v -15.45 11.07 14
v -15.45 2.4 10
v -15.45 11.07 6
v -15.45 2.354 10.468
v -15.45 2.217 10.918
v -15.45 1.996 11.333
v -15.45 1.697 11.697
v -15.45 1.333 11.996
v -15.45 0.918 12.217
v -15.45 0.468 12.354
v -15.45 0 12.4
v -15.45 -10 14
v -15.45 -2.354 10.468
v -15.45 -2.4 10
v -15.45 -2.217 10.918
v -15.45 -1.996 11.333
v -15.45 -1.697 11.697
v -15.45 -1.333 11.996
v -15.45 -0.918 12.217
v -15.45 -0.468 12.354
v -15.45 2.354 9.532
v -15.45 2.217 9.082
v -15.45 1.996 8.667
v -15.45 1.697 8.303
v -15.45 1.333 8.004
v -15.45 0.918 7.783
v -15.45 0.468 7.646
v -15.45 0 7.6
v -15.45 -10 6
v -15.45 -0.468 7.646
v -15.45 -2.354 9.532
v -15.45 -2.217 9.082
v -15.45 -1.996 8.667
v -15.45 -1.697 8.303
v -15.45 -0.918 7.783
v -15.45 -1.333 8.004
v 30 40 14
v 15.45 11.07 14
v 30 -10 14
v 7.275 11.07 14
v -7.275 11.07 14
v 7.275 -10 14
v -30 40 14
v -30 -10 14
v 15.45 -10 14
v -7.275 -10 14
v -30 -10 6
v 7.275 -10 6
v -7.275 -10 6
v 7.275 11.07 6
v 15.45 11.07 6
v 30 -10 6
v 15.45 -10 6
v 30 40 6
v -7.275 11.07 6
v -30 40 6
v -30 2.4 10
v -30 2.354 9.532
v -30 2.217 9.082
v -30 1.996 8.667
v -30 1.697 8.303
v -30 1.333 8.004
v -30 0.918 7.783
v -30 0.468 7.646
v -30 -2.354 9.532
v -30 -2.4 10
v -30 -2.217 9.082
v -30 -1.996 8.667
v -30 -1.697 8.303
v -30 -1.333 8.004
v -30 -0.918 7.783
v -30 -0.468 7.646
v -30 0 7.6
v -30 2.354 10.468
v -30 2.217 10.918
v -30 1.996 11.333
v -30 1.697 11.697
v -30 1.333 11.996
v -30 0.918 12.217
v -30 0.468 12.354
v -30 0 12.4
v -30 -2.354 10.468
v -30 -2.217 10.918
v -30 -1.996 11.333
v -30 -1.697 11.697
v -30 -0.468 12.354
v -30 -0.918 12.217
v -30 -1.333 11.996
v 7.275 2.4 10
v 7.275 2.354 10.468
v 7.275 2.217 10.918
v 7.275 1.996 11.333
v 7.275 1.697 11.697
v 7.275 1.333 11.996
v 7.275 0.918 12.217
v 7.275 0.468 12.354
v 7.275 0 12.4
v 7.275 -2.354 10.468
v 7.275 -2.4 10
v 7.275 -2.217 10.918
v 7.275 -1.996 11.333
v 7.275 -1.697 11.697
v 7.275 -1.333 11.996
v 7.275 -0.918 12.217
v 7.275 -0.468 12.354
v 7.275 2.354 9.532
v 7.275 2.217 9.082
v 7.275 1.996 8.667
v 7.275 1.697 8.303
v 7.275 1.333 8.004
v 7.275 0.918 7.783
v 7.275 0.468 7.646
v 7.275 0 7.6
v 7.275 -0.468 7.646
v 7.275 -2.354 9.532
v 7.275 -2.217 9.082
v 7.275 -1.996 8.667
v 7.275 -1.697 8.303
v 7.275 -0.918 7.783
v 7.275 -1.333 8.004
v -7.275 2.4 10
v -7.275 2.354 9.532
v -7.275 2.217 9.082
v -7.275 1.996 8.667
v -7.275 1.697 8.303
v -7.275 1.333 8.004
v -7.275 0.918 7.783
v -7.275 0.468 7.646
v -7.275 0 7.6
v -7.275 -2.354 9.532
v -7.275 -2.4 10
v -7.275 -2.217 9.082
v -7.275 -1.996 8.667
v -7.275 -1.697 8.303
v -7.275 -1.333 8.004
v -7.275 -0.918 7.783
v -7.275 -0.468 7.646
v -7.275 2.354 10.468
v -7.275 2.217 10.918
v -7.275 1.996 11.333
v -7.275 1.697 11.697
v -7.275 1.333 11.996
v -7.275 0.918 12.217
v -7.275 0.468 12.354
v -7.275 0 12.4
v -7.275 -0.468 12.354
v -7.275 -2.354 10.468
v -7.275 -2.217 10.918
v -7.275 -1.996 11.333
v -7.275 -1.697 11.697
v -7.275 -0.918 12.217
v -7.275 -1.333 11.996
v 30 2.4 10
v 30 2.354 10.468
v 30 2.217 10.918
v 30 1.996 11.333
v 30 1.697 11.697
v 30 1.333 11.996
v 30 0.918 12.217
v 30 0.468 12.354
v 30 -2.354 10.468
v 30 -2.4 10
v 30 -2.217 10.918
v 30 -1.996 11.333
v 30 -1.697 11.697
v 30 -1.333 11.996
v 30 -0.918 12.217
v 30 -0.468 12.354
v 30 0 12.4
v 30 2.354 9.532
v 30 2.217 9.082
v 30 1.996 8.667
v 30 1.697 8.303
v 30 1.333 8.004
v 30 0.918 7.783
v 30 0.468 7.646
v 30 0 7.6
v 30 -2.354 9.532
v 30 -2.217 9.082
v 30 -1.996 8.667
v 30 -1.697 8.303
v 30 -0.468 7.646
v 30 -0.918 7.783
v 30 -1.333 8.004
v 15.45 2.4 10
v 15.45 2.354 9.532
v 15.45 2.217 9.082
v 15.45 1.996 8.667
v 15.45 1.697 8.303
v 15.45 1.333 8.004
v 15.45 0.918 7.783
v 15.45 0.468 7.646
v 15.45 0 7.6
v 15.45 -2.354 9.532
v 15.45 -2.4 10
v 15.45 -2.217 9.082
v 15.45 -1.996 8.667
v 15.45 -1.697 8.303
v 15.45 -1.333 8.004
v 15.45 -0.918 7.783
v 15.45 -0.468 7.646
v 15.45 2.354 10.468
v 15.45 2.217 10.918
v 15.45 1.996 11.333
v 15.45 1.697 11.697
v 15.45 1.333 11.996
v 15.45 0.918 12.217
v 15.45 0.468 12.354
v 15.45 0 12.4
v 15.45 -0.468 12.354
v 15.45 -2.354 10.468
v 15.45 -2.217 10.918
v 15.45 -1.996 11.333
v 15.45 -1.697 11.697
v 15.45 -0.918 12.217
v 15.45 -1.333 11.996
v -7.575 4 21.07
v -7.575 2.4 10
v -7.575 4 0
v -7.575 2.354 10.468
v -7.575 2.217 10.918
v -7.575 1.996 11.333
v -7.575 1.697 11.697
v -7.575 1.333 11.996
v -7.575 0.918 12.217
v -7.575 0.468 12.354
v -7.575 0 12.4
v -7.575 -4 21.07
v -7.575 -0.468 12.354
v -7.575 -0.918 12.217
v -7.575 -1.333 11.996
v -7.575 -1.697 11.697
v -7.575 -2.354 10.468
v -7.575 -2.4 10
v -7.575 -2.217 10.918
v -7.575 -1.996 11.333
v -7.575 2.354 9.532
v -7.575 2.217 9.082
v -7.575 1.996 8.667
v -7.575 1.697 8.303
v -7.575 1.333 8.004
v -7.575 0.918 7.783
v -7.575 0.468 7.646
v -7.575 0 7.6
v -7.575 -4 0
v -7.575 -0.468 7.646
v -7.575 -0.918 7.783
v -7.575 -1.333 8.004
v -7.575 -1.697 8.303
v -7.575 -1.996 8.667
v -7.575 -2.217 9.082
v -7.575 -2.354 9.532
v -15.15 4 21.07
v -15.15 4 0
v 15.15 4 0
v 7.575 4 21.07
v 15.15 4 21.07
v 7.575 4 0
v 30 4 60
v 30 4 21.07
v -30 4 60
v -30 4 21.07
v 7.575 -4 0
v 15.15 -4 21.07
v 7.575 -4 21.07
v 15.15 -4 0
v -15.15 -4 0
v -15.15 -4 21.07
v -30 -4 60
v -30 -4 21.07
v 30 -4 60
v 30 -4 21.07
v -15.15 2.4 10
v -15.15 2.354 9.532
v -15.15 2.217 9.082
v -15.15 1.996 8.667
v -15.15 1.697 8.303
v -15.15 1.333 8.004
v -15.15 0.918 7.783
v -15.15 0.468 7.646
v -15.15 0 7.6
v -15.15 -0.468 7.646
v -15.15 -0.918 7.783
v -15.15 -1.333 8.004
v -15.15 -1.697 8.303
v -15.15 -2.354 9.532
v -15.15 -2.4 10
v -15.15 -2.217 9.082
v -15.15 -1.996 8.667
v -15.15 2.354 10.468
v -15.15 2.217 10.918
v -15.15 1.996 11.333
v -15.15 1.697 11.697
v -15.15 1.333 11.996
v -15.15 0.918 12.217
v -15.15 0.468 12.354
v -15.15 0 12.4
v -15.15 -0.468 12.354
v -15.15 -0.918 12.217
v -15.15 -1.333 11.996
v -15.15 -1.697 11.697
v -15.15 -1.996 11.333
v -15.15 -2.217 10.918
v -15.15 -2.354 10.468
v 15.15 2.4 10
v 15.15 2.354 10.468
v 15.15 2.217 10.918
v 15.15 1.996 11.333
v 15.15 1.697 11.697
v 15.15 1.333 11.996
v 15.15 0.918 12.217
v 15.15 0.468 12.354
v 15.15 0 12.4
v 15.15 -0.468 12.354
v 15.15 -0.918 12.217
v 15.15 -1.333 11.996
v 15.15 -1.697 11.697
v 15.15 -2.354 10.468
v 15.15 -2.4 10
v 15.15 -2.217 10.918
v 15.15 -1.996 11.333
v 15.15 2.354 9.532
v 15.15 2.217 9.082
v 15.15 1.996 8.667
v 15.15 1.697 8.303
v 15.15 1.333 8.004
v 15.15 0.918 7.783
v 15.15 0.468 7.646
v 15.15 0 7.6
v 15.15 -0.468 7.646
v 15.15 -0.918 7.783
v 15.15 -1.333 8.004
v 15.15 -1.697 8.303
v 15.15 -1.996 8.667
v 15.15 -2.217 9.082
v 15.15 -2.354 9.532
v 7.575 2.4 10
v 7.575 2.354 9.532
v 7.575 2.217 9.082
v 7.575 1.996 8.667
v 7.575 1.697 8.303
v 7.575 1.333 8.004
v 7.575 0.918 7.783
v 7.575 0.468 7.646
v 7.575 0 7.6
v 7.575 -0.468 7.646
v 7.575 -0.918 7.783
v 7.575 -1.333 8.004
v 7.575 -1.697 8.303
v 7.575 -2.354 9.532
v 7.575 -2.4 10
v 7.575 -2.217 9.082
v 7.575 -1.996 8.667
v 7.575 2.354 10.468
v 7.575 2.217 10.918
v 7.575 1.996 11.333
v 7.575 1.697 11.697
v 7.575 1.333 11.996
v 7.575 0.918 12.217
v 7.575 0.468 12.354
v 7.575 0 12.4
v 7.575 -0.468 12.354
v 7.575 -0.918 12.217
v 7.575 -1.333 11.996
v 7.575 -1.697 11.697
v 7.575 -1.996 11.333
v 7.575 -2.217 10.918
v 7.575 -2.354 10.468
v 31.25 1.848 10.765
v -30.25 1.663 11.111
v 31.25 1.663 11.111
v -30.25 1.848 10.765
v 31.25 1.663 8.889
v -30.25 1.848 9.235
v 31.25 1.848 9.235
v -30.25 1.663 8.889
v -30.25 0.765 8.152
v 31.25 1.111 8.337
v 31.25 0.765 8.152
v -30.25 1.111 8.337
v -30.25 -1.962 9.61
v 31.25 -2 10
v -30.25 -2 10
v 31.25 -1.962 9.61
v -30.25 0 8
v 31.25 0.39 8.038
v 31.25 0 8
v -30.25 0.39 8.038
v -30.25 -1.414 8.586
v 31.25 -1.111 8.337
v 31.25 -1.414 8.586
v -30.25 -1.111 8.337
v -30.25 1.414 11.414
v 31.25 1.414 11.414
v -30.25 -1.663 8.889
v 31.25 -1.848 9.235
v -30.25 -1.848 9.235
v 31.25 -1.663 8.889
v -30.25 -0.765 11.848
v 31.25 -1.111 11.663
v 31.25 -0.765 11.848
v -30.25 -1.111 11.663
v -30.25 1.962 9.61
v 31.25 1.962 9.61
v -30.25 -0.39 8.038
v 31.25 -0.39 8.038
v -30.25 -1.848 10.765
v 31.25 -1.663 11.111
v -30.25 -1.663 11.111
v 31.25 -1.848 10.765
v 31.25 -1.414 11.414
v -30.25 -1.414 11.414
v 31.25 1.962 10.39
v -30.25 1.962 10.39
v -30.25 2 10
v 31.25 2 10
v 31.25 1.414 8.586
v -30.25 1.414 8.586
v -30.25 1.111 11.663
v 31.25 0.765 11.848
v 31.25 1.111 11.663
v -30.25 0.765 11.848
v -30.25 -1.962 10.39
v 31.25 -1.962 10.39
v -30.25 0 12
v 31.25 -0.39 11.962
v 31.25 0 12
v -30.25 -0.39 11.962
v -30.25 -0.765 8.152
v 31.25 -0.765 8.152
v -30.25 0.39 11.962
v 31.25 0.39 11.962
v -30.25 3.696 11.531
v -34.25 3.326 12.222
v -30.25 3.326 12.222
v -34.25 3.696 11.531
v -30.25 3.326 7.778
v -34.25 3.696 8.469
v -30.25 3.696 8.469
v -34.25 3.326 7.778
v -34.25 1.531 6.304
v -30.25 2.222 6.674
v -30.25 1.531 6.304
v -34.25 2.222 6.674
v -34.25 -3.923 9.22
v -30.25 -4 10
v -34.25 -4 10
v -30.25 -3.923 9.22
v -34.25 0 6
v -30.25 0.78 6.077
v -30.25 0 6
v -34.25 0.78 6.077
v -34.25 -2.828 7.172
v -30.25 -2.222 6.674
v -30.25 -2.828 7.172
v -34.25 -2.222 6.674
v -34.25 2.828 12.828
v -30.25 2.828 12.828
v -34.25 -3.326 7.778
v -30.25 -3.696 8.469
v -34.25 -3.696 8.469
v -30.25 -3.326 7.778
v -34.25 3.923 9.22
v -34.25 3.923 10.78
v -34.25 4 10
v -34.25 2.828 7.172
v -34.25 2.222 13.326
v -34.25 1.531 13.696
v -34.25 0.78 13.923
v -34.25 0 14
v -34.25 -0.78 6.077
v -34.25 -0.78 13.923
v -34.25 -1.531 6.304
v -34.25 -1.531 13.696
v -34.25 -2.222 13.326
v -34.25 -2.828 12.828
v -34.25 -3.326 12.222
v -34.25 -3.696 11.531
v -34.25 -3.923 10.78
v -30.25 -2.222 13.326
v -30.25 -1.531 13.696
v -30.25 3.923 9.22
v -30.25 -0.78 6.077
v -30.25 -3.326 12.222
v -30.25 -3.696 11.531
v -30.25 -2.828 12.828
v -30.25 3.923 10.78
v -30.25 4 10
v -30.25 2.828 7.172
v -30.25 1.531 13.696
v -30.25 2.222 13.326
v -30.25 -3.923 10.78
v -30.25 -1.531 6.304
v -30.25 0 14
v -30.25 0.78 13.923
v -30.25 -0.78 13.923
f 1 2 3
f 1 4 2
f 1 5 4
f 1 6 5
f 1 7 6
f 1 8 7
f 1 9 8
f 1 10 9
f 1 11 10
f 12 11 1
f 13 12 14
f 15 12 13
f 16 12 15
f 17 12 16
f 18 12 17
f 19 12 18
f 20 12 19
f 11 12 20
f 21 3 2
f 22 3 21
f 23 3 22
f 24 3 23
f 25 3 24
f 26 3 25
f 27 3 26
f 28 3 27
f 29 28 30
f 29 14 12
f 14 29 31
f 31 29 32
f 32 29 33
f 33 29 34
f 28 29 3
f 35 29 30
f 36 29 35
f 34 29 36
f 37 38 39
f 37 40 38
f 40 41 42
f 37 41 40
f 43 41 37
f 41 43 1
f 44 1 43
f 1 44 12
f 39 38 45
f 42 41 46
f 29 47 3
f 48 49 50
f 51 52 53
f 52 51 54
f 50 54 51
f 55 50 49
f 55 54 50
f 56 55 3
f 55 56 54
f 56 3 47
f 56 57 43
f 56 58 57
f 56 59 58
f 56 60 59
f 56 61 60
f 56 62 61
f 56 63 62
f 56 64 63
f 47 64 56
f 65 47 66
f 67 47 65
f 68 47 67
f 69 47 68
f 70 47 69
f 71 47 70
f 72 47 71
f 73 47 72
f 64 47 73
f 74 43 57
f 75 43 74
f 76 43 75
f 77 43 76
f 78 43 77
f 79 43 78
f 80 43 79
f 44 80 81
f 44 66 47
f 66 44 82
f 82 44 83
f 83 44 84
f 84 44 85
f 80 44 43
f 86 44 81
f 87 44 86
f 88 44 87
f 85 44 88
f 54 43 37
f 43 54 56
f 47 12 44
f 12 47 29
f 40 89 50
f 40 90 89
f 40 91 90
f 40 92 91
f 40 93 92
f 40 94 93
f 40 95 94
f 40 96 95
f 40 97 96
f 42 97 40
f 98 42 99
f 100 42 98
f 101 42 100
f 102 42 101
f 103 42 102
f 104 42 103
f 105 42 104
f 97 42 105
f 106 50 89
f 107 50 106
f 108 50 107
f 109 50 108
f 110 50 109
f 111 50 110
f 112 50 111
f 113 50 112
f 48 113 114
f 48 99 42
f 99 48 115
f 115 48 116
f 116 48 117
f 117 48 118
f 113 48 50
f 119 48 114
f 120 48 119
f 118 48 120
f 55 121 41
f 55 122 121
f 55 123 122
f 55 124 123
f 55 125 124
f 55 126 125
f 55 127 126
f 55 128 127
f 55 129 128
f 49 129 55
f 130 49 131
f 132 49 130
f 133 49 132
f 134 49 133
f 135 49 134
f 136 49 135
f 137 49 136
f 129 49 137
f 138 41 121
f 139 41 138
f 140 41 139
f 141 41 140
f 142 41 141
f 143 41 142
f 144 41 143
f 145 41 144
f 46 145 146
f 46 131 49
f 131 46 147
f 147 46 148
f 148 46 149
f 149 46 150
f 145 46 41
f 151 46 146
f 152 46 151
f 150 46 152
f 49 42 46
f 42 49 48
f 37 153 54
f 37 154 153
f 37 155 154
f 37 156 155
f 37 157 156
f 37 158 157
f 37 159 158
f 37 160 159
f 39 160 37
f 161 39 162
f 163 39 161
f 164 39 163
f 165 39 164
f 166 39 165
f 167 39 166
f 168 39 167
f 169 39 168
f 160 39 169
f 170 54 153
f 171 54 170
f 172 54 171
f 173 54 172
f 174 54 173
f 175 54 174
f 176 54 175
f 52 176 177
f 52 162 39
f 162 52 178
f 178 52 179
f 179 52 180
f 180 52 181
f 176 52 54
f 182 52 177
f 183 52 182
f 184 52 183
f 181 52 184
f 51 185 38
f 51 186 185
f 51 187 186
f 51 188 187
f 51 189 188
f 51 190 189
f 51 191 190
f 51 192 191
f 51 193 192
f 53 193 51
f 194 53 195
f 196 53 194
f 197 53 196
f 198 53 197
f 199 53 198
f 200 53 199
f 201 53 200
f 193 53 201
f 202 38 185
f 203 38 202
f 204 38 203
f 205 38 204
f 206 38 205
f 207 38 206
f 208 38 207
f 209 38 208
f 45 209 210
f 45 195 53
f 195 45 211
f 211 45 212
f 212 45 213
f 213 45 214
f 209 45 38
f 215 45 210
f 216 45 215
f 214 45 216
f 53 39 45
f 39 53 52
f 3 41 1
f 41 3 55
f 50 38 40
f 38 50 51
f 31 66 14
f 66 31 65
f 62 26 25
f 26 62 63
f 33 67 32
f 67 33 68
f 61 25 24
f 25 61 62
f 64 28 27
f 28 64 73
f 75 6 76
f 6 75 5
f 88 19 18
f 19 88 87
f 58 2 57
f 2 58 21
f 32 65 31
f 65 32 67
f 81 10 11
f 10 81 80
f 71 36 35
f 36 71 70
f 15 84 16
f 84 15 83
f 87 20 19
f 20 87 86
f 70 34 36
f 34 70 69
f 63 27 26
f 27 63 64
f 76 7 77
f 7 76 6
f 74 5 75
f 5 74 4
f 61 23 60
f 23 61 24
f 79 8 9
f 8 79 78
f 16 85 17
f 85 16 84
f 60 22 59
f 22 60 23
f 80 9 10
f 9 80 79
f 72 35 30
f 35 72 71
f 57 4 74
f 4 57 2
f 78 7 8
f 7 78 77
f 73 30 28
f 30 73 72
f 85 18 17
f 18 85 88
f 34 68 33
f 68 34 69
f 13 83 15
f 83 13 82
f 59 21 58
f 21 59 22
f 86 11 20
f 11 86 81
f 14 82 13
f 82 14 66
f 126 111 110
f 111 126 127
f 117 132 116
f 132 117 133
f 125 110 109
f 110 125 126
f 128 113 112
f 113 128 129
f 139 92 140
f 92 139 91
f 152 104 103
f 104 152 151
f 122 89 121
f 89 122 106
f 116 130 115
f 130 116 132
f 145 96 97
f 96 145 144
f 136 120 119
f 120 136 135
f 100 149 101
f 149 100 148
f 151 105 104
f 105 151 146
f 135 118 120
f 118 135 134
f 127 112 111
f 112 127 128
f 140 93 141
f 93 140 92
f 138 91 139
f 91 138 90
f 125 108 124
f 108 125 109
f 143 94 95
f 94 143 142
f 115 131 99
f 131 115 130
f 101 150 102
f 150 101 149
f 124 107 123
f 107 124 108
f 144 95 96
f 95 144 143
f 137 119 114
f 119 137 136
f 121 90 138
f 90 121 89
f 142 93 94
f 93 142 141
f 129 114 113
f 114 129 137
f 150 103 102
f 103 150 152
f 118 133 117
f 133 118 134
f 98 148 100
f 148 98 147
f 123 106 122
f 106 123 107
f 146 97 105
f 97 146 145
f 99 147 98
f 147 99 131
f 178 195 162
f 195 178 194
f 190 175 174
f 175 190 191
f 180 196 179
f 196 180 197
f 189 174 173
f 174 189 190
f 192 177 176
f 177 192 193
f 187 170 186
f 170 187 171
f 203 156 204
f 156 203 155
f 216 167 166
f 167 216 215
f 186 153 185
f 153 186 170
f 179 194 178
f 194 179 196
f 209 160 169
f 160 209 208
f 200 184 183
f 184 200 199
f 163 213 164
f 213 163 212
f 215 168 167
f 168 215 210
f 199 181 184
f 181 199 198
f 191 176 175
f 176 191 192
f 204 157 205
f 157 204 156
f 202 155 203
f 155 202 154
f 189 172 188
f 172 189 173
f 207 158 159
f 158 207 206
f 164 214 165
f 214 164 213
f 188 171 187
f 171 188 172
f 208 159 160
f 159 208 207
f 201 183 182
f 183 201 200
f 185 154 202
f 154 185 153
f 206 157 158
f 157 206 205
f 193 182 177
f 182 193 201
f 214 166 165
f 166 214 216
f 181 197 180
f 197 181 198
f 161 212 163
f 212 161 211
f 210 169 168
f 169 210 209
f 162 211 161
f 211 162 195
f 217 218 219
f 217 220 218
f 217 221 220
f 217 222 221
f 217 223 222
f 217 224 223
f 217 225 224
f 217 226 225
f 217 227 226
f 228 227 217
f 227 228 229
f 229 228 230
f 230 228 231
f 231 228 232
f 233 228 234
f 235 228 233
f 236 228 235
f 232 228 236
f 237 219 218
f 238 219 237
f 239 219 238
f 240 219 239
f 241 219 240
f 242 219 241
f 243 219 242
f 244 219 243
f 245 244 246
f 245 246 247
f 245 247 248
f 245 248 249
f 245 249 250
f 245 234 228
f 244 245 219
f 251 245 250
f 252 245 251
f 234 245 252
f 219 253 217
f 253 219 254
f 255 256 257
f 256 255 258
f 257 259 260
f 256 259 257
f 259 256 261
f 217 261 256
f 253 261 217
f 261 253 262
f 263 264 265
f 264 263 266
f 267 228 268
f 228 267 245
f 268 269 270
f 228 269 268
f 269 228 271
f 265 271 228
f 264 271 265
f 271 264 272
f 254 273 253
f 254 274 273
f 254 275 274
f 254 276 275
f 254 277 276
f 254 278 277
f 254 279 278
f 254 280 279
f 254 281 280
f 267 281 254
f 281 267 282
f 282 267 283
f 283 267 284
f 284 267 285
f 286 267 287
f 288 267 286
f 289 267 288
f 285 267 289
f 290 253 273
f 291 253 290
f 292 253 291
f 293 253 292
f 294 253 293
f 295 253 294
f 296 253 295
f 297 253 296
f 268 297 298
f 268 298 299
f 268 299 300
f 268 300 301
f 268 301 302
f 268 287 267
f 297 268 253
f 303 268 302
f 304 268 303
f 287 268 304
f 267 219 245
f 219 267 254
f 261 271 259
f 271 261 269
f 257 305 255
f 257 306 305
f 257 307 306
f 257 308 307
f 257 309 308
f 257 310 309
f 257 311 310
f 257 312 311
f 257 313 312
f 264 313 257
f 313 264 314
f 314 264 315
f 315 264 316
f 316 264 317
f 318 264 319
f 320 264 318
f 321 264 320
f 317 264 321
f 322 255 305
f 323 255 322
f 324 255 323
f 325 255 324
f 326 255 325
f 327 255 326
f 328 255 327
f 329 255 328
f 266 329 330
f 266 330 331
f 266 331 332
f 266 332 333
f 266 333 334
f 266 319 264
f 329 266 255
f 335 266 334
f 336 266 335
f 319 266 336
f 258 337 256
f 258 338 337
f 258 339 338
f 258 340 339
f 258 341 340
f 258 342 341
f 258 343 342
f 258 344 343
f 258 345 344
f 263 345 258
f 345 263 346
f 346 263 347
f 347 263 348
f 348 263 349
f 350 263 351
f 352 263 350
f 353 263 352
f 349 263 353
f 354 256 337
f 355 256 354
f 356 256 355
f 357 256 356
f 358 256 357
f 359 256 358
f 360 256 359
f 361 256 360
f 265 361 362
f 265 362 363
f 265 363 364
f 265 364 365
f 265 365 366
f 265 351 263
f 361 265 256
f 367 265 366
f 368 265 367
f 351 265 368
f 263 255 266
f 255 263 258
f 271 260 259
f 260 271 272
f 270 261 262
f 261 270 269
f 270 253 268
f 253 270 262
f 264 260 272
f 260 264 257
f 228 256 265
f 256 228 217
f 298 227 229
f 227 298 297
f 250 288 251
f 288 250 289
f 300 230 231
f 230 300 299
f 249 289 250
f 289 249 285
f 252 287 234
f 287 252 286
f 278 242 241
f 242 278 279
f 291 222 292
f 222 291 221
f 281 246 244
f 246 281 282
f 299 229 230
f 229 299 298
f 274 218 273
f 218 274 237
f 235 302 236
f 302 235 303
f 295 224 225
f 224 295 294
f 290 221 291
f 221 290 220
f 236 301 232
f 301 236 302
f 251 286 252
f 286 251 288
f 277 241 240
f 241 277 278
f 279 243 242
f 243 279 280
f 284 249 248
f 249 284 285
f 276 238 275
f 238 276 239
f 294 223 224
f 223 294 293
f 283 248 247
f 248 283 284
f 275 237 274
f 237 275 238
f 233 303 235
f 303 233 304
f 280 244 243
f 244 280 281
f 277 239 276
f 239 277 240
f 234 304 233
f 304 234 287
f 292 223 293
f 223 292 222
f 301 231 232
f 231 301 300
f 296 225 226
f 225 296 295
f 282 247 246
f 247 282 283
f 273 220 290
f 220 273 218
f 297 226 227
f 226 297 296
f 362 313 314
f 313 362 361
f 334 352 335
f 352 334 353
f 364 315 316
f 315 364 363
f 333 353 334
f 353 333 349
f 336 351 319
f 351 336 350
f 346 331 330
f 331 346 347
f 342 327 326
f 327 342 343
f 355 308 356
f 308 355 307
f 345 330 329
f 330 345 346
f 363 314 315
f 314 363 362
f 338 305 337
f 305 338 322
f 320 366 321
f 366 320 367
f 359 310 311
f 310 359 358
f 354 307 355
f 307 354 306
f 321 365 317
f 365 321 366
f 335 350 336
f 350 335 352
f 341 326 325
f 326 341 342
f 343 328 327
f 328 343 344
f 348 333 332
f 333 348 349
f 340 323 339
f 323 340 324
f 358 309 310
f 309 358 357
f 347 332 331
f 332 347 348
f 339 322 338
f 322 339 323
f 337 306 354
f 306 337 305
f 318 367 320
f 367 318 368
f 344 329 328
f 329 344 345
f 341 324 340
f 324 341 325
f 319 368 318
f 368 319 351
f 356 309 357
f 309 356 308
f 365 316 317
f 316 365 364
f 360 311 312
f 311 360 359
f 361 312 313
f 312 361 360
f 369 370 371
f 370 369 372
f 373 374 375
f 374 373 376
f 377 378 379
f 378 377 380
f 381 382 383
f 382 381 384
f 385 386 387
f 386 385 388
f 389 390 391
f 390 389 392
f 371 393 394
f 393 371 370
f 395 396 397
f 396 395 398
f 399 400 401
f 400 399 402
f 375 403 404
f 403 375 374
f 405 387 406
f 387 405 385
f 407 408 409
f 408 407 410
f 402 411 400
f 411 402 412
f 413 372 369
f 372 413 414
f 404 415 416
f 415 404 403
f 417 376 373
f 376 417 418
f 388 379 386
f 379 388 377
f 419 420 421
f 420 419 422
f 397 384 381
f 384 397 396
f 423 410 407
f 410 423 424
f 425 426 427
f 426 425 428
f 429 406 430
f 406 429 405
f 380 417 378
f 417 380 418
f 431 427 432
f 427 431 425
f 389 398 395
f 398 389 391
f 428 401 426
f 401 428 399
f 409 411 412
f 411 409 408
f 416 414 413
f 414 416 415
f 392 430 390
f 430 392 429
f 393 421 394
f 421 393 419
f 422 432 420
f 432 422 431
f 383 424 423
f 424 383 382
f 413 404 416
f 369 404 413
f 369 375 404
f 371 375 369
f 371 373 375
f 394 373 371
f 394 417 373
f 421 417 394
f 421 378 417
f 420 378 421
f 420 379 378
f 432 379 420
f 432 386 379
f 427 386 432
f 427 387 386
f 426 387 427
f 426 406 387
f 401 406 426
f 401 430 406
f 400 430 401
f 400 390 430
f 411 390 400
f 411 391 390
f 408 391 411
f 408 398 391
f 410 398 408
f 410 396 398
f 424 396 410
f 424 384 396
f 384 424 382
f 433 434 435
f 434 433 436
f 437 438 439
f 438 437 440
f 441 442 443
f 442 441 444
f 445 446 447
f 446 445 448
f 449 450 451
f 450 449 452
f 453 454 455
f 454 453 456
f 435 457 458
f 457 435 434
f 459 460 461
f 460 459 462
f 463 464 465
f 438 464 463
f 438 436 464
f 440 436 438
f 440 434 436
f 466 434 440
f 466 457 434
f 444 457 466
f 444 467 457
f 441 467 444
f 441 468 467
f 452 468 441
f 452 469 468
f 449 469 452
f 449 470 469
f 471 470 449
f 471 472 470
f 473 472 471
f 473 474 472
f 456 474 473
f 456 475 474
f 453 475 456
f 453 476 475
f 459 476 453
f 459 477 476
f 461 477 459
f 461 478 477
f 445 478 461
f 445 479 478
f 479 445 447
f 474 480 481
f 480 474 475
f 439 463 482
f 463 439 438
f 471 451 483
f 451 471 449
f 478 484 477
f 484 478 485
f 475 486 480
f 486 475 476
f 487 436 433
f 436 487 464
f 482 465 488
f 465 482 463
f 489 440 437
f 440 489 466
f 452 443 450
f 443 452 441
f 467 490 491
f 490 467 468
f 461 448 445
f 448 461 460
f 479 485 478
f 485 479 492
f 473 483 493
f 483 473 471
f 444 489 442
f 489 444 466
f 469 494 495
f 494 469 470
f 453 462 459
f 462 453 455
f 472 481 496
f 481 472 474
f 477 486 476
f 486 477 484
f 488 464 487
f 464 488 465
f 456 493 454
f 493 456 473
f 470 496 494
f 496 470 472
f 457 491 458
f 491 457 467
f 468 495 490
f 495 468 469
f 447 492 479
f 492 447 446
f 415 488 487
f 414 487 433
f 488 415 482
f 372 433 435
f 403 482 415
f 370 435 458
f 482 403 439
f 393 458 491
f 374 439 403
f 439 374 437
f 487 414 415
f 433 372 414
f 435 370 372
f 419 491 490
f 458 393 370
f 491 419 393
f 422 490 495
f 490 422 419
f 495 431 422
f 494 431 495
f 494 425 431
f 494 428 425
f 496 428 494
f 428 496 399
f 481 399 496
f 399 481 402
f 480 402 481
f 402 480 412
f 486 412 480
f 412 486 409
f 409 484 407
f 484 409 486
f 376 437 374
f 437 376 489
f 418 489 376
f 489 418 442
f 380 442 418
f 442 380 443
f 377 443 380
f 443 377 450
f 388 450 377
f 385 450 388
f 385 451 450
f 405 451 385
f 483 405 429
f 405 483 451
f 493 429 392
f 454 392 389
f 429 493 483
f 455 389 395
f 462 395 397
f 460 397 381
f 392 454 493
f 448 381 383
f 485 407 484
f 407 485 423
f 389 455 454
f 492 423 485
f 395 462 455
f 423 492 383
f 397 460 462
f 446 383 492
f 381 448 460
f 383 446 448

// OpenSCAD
$fn = 32;

// ------------------------------------------------------------------------
// Butt hinge: hinge 60 mm, leaf swung 270 deg
// Every part is its own module, assembly() places every instance.
// ------------------------------------------------------------------------

// --- part 1 ---
module hinge_base() {
  difference() {
    union() {
      translate([-30, -10, -4]) cube([14.55, 50, 8]);
      translate([-7.275, -10, -4]) cube([14.55, 50, 8]);
      translate([15.45, -10, -4]) cube([14.55, 50, 8]);
      translate([-30, 11.07, -4]) cube([60, 28.93, 8]);
    }
    translate([-22.725, 0, 0]) rotate([0, 90, 0]) cylinder(h = 16.55, d = 4.8, center = true);
    translate([0, 0, 0]) rotate([0, 90, 0]) cylinder(h = 16.55, d = 4.8, center = true);
    translate([22.725, 0, 0]) rotate([0, 90, 0]) cylinder(h = 16.55, d = 4.8, center = true);
  }
}

// --- part 2 ---
module hinge_mover() {
  difference() {
    union() {
      translate([-15.15, -50, -4]) cube([7.575, 60, 8]);
      translate([7.575, -50, -4]) cube([7.575, 60, 8]);
      translate([-30, -50, -4]) cube([60, 38.93, 8]);
    }
    translate([-11.362, 0, 0]) rotate([0, 90, 0]) cylinder(h = 9.575, d = 4.8, center = true);
    translate([11.362, 0, 0]) rotate([0, 90, 0]) cylinder(h = 9.575, d = 4.8, center = true);
  }
}

// --- part 3 ---
module hinge_pin() {
  rotate([0, 90, 0]) cylinder(h = 62.5, d = 4, center = true);
  translate([-34.25, 0, 0]) rotate([0, 90, 0]) cylinder(h = 4, d = 8);
}

// --- assembly ---
module assembly() {
  color([0.80, 0.24, 0.20]) translate([0, 0, 10]) rotate([0, 0, 0]) hinge_base();
  color([0.20, 0.45, 0.75]) translate([0, 0, 10]) rotate([270, 0, 0]) hinge_mover();
  color([0.25, 0.62, 0.32]) translate([0, 0, 10]) rotate([0, 0, 0]) hinge_pin();
}

assembly();
